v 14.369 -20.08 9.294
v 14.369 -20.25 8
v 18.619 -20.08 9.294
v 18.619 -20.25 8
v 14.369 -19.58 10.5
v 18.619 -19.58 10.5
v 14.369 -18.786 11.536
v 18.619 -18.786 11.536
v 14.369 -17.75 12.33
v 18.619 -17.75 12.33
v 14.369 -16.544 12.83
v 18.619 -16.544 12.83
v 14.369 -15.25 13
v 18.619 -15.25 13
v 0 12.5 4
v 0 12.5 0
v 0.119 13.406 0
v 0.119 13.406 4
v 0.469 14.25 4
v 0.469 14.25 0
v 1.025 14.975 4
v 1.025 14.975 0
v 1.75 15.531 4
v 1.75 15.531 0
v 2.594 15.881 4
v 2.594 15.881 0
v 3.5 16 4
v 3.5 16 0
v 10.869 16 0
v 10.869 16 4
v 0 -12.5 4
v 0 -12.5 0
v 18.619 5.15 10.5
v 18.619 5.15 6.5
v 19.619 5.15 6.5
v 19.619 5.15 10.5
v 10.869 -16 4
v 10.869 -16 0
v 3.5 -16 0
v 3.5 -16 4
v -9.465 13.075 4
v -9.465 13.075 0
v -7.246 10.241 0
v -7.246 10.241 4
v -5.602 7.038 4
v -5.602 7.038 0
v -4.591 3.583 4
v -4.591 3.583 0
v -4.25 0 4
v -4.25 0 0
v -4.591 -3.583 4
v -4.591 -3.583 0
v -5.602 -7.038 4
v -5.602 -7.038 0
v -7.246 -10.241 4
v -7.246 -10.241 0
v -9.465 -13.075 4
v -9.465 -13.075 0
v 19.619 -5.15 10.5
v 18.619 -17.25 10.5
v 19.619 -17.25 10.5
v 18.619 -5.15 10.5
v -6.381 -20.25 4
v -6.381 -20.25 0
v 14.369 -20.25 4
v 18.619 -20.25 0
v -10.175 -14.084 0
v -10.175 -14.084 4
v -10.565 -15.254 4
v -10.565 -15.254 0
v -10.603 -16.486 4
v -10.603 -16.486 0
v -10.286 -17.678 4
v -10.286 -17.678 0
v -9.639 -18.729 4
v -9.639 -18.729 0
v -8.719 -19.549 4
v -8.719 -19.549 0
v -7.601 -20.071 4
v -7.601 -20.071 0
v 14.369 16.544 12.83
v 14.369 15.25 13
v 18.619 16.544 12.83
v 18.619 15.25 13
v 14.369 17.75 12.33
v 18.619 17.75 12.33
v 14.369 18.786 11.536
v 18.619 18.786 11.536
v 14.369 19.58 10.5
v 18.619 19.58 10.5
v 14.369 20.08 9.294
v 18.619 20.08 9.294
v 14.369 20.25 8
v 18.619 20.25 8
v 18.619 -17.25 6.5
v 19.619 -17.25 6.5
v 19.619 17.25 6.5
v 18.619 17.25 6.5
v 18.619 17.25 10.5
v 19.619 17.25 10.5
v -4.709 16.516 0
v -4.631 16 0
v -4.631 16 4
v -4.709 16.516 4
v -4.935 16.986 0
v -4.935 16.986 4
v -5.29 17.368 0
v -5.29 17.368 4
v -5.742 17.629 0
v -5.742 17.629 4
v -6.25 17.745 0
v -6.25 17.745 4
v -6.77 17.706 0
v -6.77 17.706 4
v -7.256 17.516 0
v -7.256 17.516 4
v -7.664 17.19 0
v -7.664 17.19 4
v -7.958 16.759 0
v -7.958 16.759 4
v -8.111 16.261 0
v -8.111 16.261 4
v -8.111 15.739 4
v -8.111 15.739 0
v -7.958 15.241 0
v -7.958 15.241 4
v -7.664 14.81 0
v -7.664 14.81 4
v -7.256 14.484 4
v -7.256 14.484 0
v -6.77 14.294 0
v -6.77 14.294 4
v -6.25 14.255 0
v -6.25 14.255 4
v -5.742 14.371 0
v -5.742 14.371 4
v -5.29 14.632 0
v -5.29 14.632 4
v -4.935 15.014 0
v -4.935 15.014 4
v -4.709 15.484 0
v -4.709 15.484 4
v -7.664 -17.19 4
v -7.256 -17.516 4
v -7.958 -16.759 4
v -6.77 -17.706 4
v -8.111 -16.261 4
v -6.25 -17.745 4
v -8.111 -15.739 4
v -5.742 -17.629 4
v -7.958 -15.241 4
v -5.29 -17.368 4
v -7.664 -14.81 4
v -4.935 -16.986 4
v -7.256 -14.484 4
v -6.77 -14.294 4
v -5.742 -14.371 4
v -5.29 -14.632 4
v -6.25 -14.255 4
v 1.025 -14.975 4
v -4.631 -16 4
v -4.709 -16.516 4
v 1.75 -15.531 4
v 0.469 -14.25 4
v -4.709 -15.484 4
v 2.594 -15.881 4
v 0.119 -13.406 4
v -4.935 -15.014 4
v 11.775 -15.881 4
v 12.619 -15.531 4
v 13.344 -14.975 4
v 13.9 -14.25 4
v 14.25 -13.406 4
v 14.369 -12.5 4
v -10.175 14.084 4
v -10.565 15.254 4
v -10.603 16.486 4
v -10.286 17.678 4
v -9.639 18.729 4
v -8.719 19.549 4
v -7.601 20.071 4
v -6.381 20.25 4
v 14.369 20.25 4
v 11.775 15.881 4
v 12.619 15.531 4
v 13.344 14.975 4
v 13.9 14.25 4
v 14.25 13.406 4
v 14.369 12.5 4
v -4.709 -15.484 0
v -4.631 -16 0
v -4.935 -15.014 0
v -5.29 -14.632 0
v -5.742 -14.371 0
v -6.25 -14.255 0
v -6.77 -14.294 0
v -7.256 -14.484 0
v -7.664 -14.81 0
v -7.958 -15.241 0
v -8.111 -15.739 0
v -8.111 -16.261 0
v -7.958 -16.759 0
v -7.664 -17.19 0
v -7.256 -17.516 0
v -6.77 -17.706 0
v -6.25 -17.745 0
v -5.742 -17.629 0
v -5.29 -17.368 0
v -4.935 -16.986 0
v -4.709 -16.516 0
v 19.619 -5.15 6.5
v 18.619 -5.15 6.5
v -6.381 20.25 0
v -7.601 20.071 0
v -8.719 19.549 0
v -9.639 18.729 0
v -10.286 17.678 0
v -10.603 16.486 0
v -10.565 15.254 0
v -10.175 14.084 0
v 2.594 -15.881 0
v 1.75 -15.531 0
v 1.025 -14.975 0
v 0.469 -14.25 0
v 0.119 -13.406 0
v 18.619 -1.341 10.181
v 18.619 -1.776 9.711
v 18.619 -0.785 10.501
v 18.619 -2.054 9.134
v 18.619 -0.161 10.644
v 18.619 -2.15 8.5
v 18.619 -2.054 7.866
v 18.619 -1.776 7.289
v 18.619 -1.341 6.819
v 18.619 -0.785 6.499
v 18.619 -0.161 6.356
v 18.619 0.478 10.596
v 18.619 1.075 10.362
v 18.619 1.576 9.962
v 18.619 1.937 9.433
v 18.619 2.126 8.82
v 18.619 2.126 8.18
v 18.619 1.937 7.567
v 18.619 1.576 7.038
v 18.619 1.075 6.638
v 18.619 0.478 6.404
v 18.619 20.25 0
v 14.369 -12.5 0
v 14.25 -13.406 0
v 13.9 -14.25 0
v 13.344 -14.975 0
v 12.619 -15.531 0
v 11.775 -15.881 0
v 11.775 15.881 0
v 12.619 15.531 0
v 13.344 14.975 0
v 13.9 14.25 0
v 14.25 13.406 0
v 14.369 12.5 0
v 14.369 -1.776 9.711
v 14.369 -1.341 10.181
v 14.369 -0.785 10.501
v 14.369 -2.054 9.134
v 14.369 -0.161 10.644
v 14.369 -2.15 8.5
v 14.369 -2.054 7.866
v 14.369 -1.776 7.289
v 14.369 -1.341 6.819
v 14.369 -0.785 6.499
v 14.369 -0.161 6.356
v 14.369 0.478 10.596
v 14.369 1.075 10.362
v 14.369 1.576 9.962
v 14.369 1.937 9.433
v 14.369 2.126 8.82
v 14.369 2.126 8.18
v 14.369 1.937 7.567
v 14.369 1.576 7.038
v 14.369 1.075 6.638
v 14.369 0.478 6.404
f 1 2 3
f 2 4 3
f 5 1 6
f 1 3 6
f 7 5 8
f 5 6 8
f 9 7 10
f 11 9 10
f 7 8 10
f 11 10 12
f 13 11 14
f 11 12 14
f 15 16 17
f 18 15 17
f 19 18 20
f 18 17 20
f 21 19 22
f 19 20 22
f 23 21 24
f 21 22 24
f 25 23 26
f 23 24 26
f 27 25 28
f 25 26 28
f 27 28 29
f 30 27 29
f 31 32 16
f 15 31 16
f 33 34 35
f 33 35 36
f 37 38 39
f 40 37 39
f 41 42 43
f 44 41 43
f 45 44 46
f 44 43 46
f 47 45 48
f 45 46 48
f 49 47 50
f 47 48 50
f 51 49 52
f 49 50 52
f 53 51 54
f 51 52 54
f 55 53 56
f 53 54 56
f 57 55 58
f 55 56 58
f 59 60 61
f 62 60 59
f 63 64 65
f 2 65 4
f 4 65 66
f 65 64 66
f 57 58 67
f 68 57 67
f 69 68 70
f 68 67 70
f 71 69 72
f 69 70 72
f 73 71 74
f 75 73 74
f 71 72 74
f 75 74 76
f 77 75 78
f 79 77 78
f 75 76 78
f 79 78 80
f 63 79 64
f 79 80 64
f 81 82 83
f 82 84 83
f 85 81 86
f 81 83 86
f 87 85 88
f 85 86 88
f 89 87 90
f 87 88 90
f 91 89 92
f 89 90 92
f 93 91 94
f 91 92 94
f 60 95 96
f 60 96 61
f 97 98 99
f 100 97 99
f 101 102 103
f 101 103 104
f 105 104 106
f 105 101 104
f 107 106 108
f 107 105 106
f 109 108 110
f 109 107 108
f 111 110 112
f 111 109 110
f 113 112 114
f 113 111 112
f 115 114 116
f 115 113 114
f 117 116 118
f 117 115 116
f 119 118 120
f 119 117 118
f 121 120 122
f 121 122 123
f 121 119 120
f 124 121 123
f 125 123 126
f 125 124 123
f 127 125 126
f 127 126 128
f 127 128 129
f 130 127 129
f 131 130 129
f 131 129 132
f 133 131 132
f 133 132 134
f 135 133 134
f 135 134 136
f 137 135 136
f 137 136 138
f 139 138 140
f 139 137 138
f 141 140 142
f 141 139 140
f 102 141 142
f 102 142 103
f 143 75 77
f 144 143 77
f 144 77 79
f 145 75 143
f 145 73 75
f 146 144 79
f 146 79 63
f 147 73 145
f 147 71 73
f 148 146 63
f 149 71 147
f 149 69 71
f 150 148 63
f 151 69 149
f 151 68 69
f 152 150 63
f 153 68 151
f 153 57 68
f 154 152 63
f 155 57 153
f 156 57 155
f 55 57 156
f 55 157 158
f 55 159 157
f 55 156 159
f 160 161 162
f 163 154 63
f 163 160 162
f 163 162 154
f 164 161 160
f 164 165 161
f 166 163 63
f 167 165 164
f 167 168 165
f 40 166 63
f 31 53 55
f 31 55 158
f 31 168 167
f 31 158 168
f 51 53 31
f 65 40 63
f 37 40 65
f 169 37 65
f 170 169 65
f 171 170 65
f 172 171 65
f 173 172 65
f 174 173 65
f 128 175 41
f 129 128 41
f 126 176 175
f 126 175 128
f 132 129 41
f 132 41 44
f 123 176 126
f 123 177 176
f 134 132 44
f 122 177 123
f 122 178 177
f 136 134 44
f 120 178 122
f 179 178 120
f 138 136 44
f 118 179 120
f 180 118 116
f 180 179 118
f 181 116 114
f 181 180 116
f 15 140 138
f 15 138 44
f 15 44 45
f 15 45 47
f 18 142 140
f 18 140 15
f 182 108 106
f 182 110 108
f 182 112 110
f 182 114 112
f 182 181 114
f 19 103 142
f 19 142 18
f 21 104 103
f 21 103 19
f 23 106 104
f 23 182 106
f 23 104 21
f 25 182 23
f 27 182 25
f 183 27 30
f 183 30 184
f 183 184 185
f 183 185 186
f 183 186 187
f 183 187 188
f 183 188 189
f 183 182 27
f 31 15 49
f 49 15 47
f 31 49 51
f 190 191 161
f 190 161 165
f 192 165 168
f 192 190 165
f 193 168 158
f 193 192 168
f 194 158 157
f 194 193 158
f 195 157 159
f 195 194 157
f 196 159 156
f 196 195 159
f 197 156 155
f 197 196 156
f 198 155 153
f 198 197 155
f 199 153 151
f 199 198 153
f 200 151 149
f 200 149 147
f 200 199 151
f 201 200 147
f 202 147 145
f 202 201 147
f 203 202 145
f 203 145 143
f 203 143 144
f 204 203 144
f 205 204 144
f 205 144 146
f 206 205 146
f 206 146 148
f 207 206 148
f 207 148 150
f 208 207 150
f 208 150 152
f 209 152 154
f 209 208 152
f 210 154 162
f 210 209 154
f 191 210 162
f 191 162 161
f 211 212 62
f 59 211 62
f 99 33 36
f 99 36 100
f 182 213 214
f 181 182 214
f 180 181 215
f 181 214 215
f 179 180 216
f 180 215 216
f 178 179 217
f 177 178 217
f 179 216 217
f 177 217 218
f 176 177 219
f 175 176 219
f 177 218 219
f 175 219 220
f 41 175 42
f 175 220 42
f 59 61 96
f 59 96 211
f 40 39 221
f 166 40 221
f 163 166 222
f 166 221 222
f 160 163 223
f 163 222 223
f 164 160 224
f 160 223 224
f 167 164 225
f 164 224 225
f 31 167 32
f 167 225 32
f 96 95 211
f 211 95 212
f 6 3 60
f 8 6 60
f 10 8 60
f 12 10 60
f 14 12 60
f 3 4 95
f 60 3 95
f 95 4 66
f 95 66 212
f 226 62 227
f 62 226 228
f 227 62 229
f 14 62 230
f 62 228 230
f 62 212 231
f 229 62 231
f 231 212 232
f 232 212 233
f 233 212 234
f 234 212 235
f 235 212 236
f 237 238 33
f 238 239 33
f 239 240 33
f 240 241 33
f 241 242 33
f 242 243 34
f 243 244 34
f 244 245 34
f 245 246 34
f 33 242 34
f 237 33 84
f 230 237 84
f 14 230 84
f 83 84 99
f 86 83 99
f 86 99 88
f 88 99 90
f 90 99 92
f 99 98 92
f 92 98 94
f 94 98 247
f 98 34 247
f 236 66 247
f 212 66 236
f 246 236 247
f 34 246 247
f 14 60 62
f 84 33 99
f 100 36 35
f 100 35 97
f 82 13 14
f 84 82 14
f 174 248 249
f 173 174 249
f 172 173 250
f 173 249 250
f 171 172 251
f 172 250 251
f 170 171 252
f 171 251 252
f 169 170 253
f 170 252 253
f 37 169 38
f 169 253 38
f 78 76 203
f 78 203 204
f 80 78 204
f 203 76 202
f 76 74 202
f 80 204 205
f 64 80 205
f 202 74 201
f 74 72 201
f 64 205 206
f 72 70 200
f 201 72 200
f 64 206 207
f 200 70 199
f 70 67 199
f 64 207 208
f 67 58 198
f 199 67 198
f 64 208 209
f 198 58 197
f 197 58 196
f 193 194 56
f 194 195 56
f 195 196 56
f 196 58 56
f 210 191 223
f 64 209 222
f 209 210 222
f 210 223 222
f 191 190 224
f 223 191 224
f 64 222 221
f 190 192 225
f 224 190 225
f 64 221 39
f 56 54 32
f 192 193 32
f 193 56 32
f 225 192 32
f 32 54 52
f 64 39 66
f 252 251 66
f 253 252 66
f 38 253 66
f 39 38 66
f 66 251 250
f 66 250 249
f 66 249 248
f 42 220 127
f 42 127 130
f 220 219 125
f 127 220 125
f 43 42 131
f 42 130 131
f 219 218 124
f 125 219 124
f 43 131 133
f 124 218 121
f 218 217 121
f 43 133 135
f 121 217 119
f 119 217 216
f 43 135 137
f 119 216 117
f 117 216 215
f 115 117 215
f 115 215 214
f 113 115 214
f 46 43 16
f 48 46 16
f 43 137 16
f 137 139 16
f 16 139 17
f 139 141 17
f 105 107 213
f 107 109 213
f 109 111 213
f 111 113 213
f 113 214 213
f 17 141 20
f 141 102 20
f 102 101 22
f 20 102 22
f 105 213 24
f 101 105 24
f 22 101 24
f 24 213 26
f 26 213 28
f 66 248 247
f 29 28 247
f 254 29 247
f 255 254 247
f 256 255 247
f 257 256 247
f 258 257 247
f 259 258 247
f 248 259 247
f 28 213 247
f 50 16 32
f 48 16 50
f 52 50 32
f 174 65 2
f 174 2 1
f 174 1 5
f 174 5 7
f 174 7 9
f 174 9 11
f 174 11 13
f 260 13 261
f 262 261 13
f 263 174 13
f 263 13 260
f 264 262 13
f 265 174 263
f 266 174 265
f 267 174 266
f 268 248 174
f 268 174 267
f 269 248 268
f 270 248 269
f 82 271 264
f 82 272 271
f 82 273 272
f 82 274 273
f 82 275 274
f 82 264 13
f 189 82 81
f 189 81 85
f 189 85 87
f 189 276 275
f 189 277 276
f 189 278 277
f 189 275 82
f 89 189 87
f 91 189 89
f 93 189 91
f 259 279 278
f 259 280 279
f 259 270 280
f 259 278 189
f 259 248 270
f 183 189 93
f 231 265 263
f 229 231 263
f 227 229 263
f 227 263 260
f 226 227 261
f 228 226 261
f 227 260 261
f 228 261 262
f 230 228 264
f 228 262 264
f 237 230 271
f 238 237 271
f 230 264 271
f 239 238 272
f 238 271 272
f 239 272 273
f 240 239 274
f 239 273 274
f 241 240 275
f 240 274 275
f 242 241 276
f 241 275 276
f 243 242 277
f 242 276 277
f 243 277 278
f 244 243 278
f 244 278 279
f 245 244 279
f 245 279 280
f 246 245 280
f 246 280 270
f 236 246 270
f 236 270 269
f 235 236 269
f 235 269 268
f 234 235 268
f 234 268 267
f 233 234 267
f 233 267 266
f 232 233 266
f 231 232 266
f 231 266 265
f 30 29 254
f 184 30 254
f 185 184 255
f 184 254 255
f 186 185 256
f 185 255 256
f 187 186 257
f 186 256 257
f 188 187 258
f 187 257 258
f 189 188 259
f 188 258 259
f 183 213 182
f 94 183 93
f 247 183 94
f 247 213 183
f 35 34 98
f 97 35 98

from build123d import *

# Parameters (mm, degrees)
F0_R     = 1.75
F1_DEPTH = 4
F2_W     = 4.25
F2_H     = 40.5
F3_DEPTH = 9
F4_R     = 2.15
F5_DEPTH = 25
F6_R     = 5
F7_W     = 12.1
F7_H     = 4
F8_DEPTH = 1


with BuildPart() as f1:
    # F0 (on Top) → F1 (new body)
    with BuildSketch(Plane.XY):
        with BuildLine():
            Line((18.61898, 20.25), (-6.38102, 20.25))
            ThreePointArc((-6.38102, 20.25), (-10.285671, 17.678153), (-9.464597, 13.075269))
            ThreePointArc((-9.464597, 13.075269), (-4.25, 0), (-9.464597, -13.075269))
            ThreePointArc((-9.464597, -13.075269), (-10.285671, -17.678153), (-6.38102, -20.25))
            Line((-6.38102, -20.25), (18.61898, -20.25))
            Line((18.61898, -20.25), (18.61898, 0))
            Line((18.61898, 0), (18.61898, 20.25))
        make_face()
        with Locations((-6.38102, -16)):
            Circle(F0_R, mode=Mode.SUBTRACT)
        with Locations((-6.38102, 16)):
            Circle(F0_R, mode=Mode.SUBTRACT)
        with BuildLine():
            Line((3.5, 16), (10.86898, 16))
            ThreePointArc((10.86898, 16), (13.343854, 14.974874), (14.36898, 12.5))
            Line((14.36898, 12.5), (14.36898, -12.5))
            ThreePointArc((14.36898, -12.5), (13.343854, -14.974874), (10.86898, -16))
            Line((10.86898, -16), (3.5, -16))
            ThreePointArc((3.5, -16), (1.025126, -14.974874), (0, -12.5))
            Line((0, -12.5), (0, 12.5))
            ThreePointArc((0, 12.5), (1.025126, 14.974874), (3.5, 16))
        make_face(mode=Mode.SUBTRACT)
    extrude(amount=F1_DEPTH)

    # F2 (on face) → F3 (join)
    with BuildSketch(Plane.XY.offset(4)):
        with Locations((16.49398, 0)):
            Rectangle(F2_W, F2_H)
    extrude(amount=F3_DEPTH)

    # F4 (on face) → F5 (cut)
    with BuildSketch(Plane(origin=(14.36898, 0, 0), x_dir=(0, -1, 0), z_dir=(-1, 0, 0))):
        with Locations((0, 8.5)):
            Circle(F4_R)
    extrude(amount=-F5_DEPTH, mode=Mode.SUBTRACT)

    # F6
    f6_edges = [f1.edges().sort_by_distance(p)[0] for p in [
        (16.49398, -20.25, 13),
        (16.49398, 20.25, 13),
    ]]
    fillet(f6_edges, radius=F6_R)

    # F7 (on face) → F8 (join)
    with BuildSketch(Plane.YZ.offset(18.61898)):
        with Locations((-11.2, 8.5)):
            Rectangle(F7_W, F7_H)
        with Locations((11.2, 8.5)):
            Rectangle(F7_W, F7_H)
    extrude(amount=F8_DEPTH)


solid = f1.part
